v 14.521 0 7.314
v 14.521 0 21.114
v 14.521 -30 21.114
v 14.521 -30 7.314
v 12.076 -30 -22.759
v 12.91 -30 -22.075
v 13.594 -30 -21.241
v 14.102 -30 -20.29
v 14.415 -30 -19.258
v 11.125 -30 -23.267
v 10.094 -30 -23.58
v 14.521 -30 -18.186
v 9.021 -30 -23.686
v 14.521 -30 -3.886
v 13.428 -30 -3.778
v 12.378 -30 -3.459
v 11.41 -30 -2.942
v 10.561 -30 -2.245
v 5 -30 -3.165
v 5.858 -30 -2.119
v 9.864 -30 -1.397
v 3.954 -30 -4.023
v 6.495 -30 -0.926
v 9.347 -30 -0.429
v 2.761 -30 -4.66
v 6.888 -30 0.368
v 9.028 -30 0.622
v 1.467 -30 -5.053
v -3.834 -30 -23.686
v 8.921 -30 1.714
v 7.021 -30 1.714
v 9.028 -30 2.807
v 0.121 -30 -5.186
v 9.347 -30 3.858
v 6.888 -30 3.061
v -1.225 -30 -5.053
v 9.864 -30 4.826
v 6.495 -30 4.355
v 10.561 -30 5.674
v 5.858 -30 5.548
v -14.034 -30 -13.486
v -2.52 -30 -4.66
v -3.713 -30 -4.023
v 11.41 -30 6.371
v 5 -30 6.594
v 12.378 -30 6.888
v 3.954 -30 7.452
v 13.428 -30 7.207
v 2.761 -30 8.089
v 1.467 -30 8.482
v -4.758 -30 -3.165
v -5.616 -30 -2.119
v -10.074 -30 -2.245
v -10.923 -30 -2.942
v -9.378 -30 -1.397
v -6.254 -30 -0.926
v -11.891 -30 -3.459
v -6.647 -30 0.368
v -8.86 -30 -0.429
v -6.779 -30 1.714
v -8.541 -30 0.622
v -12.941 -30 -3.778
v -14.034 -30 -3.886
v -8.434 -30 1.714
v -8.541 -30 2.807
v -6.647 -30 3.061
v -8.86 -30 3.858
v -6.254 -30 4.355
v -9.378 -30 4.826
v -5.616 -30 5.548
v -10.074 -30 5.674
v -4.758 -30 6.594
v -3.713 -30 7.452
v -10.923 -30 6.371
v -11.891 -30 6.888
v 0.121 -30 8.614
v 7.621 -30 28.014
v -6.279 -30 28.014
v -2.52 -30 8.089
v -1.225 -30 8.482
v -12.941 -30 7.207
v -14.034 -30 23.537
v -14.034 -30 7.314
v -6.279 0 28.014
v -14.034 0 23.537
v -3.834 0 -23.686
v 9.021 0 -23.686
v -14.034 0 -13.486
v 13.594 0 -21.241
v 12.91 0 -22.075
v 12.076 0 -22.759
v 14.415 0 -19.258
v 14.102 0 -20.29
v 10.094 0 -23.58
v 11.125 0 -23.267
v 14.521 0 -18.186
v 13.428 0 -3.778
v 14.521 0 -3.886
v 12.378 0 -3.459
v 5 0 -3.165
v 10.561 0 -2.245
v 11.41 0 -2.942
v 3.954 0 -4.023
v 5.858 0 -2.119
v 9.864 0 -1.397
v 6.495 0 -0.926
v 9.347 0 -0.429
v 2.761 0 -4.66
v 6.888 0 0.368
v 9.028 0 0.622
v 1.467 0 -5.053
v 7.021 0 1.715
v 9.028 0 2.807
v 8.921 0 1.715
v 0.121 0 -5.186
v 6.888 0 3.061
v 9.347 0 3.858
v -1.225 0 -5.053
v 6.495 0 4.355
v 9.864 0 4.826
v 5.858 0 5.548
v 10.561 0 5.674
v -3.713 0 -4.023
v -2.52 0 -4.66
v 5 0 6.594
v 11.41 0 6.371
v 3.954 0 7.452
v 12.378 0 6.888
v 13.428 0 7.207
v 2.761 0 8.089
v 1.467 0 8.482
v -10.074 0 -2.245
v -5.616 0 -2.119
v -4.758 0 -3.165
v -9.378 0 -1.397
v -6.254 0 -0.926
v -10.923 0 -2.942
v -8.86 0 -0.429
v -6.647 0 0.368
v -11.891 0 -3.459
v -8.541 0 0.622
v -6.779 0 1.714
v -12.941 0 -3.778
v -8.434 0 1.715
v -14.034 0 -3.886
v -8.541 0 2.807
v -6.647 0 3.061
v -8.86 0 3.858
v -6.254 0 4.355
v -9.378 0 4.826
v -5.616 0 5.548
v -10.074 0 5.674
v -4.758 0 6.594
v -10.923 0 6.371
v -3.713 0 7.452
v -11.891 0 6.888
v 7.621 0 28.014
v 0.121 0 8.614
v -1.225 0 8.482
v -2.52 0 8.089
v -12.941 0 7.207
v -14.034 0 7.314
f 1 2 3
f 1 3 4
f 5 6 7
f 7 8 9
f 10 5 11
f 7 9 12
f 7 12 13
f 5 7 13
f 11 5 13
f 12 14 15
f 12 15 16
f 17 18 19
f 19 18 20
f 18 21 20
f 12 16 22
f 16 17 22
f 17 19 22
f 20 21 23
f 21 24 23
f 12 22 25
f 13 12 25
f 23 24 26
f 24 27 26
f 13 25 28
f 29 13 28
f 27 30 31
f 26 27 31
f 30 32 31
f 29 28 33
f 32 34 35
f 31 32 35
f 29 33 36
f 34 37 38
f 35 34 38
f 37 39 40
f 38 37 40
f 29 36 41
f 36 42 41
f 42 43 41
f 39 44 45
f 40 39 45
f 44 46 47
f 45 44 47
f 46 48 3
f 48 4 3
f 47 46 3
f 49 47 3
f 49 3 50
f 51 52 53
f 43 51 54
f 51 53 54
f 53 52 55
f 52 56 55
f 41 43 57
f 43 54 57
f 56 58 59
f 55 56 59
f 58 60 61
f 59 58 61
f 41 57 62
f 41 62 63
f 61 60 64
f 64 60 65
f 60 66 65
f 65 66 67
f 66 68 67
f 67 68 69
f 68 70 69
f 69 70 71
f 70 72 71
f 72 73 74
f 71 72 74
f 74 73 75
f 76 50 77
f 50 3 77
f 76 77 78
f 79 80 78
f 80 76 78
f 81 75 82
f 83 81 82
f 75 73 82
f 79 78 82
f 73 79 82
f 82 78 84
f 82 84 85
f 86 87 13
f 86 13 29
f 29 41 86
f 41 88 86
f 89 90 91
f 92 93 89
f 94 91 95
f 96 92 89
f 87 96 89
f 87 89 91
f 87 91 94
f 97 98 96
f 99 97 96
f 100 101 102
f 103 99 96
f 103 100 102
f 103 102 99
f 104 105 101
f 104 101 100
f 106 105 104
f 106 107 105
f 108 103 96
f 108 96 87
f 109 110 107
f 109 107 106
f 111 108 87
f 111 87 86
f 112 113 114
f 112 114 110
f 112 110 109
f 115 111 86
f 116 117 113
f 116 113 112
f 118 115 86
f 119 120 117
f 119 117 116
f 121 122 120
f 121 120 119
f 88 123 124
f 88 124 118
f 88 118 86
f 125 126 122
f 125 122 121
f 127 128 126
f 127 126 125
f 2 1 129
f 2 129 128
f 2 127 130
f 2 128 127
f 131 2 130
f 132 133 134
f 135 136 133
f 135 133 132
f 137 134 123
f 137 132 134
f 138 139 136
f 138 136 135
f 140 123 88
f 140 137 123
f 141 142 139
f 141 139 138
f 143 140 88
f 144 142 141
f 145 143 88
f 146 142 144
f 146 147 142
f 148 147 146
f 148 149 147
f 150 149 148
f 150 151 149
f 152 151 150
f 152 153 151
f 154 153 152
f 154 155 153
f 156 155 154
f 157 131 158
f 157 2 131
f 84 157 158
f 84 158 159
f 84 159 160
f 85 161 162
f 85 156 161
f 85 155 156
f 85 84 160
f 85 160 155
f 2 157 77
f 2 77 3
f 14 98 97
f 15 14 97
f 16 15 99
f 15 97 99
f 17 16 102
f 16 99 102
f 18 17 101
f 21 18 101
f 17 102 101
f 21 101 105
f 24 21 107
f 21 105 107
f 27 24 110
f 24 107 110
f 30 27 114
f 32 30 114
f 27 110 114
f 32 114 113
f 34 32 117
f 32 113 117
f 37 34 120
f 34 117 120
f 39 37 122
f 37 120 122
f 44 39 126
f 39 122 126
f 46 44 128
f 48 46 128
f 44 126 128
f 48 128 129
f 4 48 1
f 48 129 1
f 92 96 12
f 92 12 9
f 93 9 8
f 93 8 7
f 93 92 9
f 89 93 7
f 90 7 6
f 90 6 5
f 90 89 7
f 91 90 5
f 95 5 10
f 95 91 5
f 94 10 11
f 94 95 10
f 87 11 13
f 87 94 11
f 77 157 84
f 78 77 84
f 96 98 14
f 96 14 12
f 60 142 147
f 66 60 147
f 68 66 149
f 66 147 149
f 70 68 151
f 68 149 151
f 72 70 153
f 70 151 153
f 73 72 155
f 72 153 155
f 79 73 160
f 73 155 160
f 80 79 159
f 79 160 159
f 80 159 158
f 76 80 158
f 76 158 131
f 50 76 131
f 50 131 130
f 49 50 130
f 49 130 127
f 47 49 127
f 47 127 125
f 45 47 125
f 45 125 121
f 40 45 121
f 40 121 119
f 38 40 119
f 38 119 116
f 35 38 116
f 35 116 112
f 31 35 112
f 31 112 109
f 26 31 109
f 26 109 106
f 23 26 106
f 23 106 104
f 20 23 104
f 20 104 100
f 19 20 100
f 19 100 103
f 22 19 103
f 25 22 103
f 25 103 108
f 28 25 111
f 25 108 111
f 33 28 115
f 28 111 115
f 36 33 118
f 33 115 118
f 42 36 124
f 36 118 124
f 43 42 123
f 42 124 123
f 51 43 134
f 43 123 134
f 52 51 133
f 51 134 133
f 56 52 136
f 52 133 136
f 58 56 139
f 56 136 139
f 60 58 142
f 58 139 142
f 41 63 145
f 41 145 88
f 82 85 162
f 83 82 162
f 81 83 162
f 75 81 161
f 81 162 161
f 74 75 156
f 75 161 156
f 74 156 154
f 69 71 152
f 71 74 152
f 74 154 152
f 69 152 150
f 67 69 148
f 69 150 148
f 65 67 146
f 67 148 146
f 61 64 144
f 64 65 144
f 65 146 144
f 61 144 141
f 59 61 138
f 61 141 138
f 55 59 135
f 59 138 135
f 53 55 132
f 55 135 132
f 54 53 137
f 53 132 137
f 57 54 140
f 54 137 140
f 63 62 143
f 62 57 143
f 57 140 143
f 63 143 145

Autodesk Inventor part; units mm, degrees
ref_plane "YZ Plane" through (0, 0, 0) normal (1, 0, 0) x (0, 1, 0)
ref_plane "XZ Plane" through (0, 0, 0) normal (0, 1, 0) x (-1, 0, 0)
ref_plane "XY Plane" through (0, 0, 0) normal (0, 0, 1) x (1, 0, 0)
sketch "Sketch1" plane through (0, 0, 0) normal (0, 0, 1) x (1, 0, 0)
  point P0 (0, 0)
sketch "Sketch2" plane through (0, 0, 0) normal (0, 1, 0) x (-1, 0, 0)
  line L0 (18.3793, 32.1145) -> (-18.6207, 32.1145)
  line L1 (-18.6207, 32.1145) -> (-18.6207, -28.8855)
  line L2 (-18.6207, -28.8855) -> (18.3793, -28.8855)
  line L3 (18.3793, -28.8855) -> (18.3793, 32.1145)
  line L4 (-18.6207, 32.1145) -> (-18.6207, 28.0145)
  line L5 (-18.6207, 28.0145) -> (-14.5207, 28.0145)
  line L6 (-14.5207, 28.0145) -> (-7.6207, 28.0145)
  line L7 (-7.6207, 28.0145) -> (6.2793, 28.0145)
  line L8 (6.2793, 28.0145) -> (14.2793, 28.0145) construction
  line L9 (14.0338, 32.3374) -> (14.0338, 23.5374)
  line L10 (6.2793, 28.0145) -> (14.0338, 23.5374)
  line L11 (14.0338, 23.5374) -> (14.0338, 7.3145)
  arc A0 (14.0338, 7.3145) -> (14.0338, -3.8855) centre (14.0338, 1.7145) ccw
  line L12 (14.0338, -3.8855) -> (14.0338, -13.4855)
  arc A1 (-14.5207, -3.8855) -> (-14.5207, 7.3145) centre (-14.5207, 1.7145) ccw
  line L13 (-14.5207, -3.8855) -> (-14.5207, -18.1855)
  line L14 (-7.6207, 28.0145) -> (-14.5207, 21.1145)
  line L15 (-14.5207, 32.1145) -> (-14.5207, 28.0145)
  line L16 (-14.5207, 21.1145) -> (-14.5207, 7.3145)
  line L17 (-14.5207, -18.1855) -> (-14.5207, -23.6855) construction
  line L18 (-14.5207, -23.6855) -> (3.8338, -23.6855)
  line L19 (14.0338, -13.4855) -> (3.8338, -23.6855)
  line L20 (-1.3662, -28.8855) -> (-1.8697, -29.389)
  arc A2 (-14.5207, -18.1855) -> (-9.0207, -23.6855) centre (-9.0207, -18.1855) ccw
  line L21 (14.0338, 1.7145) -> (-14.5207, 1.7145)
  circle A3 centre (-0.1207, 1.7145) radius 6.9
  point P0 (0, 0)
  dimension "d2" = 37
  dimension "d3" = 61
  dimension "d4" = 4.1
  dimension "d5" = 4.1
  dimension "d6" = 6.9
  dimension "d7" = 13.9
  dimension "d9" = 8.8
  dimension "d10" = 30
  dimension "d12" = 30.4
  dimension "d13" = 24.8
  dimension "d14" = 45.6
  dimension "d16" = 24.8
  dimension "d17" = 30.4
  dimension "d20" = 50.3
  dimension "d21" = 45
  dimension "d22" = 5.5
  dimension "d24" = 5.5
  dimension "d25" = 5.5
  dimension "d26" = 18.5
  dimension "d27" = 13.8
extrude "Extrusion1" add sketch "Sketch2" against normal blind 30 contours L11 A0 L21 A3 A1 L16 L14 L7 L10 | A0 L12 L19 L18 A2 L13 A1 L21 A3
sketch "Sketch3" plane through (0, 0, 0) normal (0, 1, 0) x (1, 0, 0)
  line L0 (7.6207, -28.0145) -> (-6.2793, -28.0145) projected
  line L1 (7.6207, -28.0145) -> (14.5207, -21.1145) projected
  line L2 (14.5207, -21.1145) -> (14.5207, -7.3145) projected
  arc A0 (14.5207, 3.8855) -> (14.5207, -7.3145) centre (14.5207, -1.7145) ccw projected
  line L3 (14.5207, 3.8855) -> (14.5207, 18.1855) projected
  arc A1 (14.5207, 18.1855) -> (9.0207, 23.6855) centre (9.0207, 18.1855) ccw projected
  line L4 (9.0207, 23.6855) -> (-3.8338, 23.6855) projected
  line L5 (-3.8338, 23.6855) -> (-14.0338, 13.4855) projected
  line L6 (-14.0338, 13.4855) -> (-14.0338, 3.8855) projected
  arc A2 (-14.0338, -7.3145) -> (-14.0338, 3.8855) centre (-14.0338, -1.7145) ccw projected
  line L7 (-14.0338, -23.5374) -> (-14.0338, -7.3145) projected
  line L8 (-14.0338, -23.5374) -> (-6.2793, -28.0145) projected
  circle A3 centre (0.1207, -1.7145) radius 6.9 projected
  point P0 (0, 0)
  point P1 (14.5207, -28.0145)
